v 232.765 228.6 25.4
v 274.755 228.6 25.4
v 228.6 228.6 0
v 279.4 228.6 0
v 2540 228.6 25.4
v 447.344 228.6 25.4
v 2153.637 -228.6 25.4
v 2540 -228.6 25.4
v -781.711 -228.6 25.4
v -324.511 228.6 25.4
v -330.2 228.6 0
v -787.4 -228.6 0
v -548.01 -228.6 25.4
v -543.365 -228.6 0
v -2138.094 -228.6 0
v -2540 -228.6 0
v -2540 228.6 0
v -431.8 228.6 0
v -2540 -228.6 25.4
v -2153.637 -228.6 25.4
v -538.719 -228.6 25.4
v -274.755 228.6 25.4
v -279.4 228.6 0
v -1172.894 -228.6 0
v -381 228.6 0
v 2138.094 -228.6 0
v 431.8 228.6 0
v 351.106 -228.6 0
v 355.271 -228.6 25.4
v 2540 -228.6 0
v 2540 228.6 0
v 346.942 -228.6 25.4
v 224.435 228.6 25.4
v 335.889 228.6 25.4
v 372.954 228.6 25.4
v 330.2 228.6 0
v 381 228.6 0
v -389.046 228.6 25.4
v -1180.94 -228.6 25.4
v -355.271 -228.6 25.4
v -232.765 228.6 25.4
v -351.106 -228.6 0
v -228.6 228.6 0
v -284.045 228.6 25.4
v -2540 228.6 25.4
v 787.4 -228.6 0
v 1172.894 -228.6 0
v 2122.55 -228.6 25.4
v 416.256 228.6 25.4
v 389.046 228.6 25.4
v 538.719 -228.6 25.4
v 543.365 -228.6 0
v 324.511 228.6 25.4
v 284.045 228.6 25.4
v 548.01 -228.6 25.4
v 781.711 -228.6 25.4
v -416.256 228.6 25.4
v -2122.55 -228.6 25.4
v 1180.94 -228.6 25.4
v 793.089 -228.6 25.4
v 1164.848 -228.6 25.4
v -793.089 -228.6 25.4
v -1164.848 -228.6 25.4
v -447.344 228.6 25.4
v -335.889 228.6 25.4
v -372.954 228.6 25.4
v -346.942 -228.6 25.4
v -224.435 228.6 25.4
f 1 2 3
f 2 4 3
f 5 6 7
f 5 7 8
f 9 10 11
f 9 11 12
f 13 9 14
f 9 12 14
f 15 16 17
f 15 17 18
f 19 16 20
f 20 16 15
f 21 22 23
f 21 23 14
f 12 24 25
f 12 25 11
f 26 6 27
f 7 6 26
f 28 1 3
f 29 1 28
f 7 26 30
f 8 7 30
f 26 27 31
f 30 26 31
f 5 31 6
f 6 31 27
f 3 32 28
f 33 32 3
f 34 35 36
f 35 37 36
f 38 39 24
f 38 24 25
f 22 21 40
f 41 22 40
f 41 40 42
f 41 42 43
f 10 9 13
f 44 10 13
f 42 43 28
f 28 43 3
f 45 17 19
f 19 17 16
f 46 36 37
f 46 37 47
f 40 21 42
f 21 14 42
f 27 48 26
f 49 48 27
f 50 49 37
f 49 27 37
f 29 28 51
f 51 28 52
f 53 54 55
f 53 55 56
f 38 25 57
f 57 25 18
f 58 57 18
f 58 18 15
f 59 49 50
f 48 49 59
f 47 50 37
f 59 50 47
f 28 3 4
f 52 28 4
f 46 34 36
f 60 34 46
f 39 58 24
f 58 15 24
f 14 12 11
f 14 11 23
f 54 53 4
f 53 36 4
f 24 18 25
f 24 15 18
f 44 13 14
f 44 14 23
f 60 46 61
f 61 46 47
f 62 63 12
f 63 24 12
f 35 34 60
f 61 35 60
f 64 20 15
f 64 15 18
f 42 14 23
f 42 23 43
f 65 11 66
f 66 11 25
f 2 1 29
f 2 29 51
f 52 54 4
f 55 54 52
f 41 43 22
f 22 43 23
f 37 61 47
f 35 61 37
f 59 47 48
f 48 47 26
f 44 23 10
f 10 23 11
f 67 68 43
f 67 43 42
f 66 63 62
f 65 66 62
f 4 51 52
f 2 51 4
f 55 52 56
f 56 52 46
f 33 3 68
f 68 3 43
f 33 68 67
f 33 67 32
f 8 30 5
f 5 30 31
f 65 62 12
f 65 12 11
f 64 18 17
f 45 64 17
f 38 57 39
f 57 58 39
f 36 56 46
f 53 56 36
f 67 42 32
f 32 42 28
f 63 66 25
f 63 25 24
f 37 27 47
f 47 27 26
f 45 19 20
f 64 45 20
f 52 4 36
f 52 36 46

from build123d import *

# Parameters (mm, degrees)
F2_DEPTH    = 25.4
F3_DEPTH    = 25.4
F4_DEPTH    = 25.4
F5_DEPTH    = 25.4
F6_DEPTH    = 25.4
F7_DEPTH    = 25.4
F8_DEPTH    = 25.4
F9_DEPTH    = 25.4
F10_DEPTH   = 25.4
F11_DEPTH   = 25.4
F12_DEPTH   = 25.4
F13_SIZE2   = 4.022955
F13_SIZE    = 25.39999
F14_SIZE2   = 4.022955
F14_SIZE    = 25.39999
F14_2_SIZE2 = 4.022955
F14_2_SIZE  = 25.39999
F15_SIZE2   = 4.022955
F15_SIZE    = 25.39999
F15_2_SIZE2 = 4.022955
F15_2_SIZE  = 25.39999
F16_SIZE2   = 4.022955
F16_SIZE    = 25.39999
F16_2_SIZE2 = 4.022955
F16_2_SIZE  = 25.39999
F17_SIZE2   = 4.022955
F17_SIZE    = 25.39999
F17_2_SIZE2 = 4.022955
F17_2_SIZE  = 25.39999
F18_SIZE2   = 4.022955
F18_SIZE    = 25.39999
F18_2_SIZE2 = 4.022955
F18_2_SIZE  = 25.39999
F19_SIZE2   = 4.022955
F19_SIZE    = 25.39999
F19_2_SIZE2 = 4.022955
F19_2_SIZE  = 25.39999
F20_SIZE2   = 4.022955
F20_SIZE    = 25.39999
F20_2_SIZE2 = 4.022955
F20_2_SIZE  = 25.39999
F21_SIZE2   = 4.022955
F21_SIZE    = 25.39999
F21_2_SIZE2 = 4.022955
F21_2_SIZE  = 25.39999
F22_SIZE2   = 4.022955
F22_SIZE    = 25.39999
F22_2_SIZE2 = 4.022955
F22_2_SIZE  = 25.39999
F23_SIZE2   = 4.022955
F23_SIZE    = 25.39999


# Not quite as in the source:
# - a fillet or chamfer is up to 0.001 mm smaller than in the source, because OpenCascade refuses the exact size


with BuildPart() as f2:
    # F1 (on Top) → F2 (new body)
    with BuildSketch(Plane.XY):
        Polygon((-431.8, 228.6), (-2540, 228.6), (-2540, -228.6), (-2138.0936292205, -228.6), align=None)
    extrude(amount=F2_DEPTH)

    # F13 (size 25.4 and 4.0229647842 in the source; OpenCascade refuses exactly that, so slightly less here)
    f13_edges = [f2.edges().sort_by_distance(p)[0] for p in [
        (-1284.946815, 0, 25.4),
    ]]
    f13_side = f2.faces().sort_by_distance((-1284.946815, 0, 12.7))[0]
    chamfer(f13_edges, length=F13_SIZE, length2=F13_SIZE2, reference=f13_side)


with BuildPart() as f3:
    # F1 (on Top) → F3 (new body)
    with BuildSketch(Plane.XY):
        Polygon((-381, 228.6), (-431.8, 228.6), (-2138.0936292205, -228.6), (-1172.8936292205, -228.6), align=None)
    extrude(amount=F3_DEPTH)

    # F14 (size 25.4 and 4.0229647842 in the source; OpenCascade refuses exactly that, so slightly less here)
    f14_edges = [f3.edges().sort_by_distance(p)[0] for p in [
        (-1284.946815, 0, 25.4),
    ]]
    f14_side = f3.faces().sort_by_distance((-1284.946815, 0, 12.7))[0]
    chamfer(f14_edges, length=F14_SIZE, length2=F14_SIZE2, reference=f14_side)

    # F14#2 (size 25.4 and 4.0229647842 in the source; OpenCascade refuses exactly that, so slightly less here)
    f14_2_edges = [f3.edges().sort_by_distance(p)[0] for p in [
        (-776.946815, 0, 25.4),
    ]]
    f14_2_side = f3.faces().sort_by_distance((-776.946815, 0, 12.7))[0]
    chamfer(f14_2_edges, length=F14_2_SIZE, length2=F14_2_SIZE2, reference=f14_2_side)


with BuildPart() as f4:
    # F1 (on Top) → F4 (new body)
    with BuildSketch(Plane.XY):
        Polygon((-330.2, 228.6), (-381, 228.6), (-1172.8936292205, -228.6), (-787.4, -228.6), align=None)
    extrude(amount=F4_DEPTH)

    # F15 (size 25.4 and 4.0229647842 in the source; OpenCascade refuses exactly that, so slightly less here)
    f15_edges = [f4.edges().sort_by_distance(p)[0] for p in [
        (-776.946815, 0, 25.4),
    ]]
    f15_side = f4.faces().sort_by_distance((-776.946815, 0, 12.7))[0]
    chamfer(f15_edges, length=F15_SIZE, length2=F15_SIZE2, reference=f15_side)

    # F15#2 (size 25.4 and 4.0229647842 in the source; OpenCascade refuses exactly that, so slightly less here)
    f15_2_edges = [f4.edges().sort_by_distance(p)[0] for p in [
        (-558.8, 0, 25.4),
    ]]
    f15_2_side = f4.faces().sort_by_distance((-558.8, 0, 12.7))[0]
    chamfer(f15_2_edges, length=F15_2_SIZE, length2=F15_2_SIZE2, reference=f15_2_side)


with BuildPart() as f5:
    # F1 (on Top) → F5 (new body)
    with BuildSketch(Plane.XY):
        Polygon((-279.4, 228.6), (-330.2, 228.6), (-787.4, -228.6), (-543.3645430735, -228.6), align=None)
    extrude(amount=F5_DEPTH)

    # F16 (size 25.4 and 4.0229647842 in the source; OpenCascade refuses exactly that, so slightly less here)
    f16_edges = [f5.edges().sort_by_distance(p)[0] for p in [
        (-558.8, 0, 25.4),
    ]]
    f16_side = f5.faces().sort_by_distance((-558.8, 0, 12.7))[0]
    chamfer(f16_edges, length=F16_SIZE, length2=F16_SIZE2, reference=f16_side)

    # F16#2 (size 25.4 and 4.0229647842 in the source; OpenCascade refuses exactly that, so slightly less here)
    f16_2_edges = [f5.edges().sort_by_distance(p)[0] for p in [
        (-411.382272, 0, 25.4),
    ]]
    f16_2_side = f5.faces().sort_by_distance((-411.382272, 0, 12.7))[0]
    chamfer(f16_2_edges, length=F16_2_SIZE, length2=F16_2_SIZE2, reference=f16_2_side)


with BuildPart() as f6:
    # F1 (on Top) → F6 (new body)
    with BuildSketch(Plane.XY):
        Polygon((-228.6, 228.6), (-279.4, 228.6), (-543.3645430735, -228.6), (-351.1063707795, -228.6), align=None)
    extrude(amount=F6_DEPTH)

    # F17 (size 25.4 and 4.0229647842 in the source; OpenCascade refuses exactly that, so slightly less here)
    f17_edges = [f6.edges().sort_by_distance(p)[0] for p in [
        (-411.382272, 0, 25.4),
    ]]
    f17_side = f6.faces().sort_by_distance((-411.382272, 0, 12.7))[0]
    chamfer(f17_edges, length=F17_SIZE, length2=F17_SIZE2, reference=f17_side)

    # F17#2 (size 25.4 and 4.0229647842 in the source; OpenCascade refuses exactly that, so slightly less here)
    f17_2_edges = [f6.edges().sort_by_distance(p)[0] for p in [
        (-289.853185, 0, 25.4),
    ]]
    f17_2_side = f6.faces().sort_by_distance((-289.853185, 0, 12.7))[0]
    chamfer(f17_2_edges, length=F17_2_SIZE, length2=F17_2_SIZE2, reference=f17_2_side)


with BuildPart() as f7:
    # F1 (on Top) → F7 (new body)
    with BuildSketch(Plane.XY):
        Polygon((228.6, 228.6), (-228.6, 228.6), (-351.1063707795, -228.6), (351.1063707795, -228.6), align=None)
    extrude(amount=F7_DEPTH)

    # F18 (size 25.4 and 4.0229647842 in the source; OpenCascade refuses exactly that, so slightly less here)
    f18_edges = [f7.edges().sort_by_distance(p)[0] for p in [
        (-289.853185, 0, 25.4),
    ]]
    f18_side = f7.faces().sort_by_distance((-289.853185, 0, 12.7))[0]
    chamfer(f18_edges, length=F18_SIZE, length2=F18_SIZE2, reference=f18_side)

    # F18#2 (size 25.4 and 4.0229647842 in the source; OpenCascade refuses exactly that, so slightly less here)
    f18_2_edges = [f7.edges().sort_by_distance(p)[0] for p in [
        (289.853185, 0, 25.4),
    ]]
    f18_2_side = f7.faces().sort_by_distance((289.853185, 0, 12.7))[0]
    chamfer(f18_2_edges, length=F18_2_SIZE, length2=F18_2_SIZE2, reference=f18_2_side)


with BuildPart() as f8:
    # F1 (on Top) → F8 (new body)
    with BuildSketch(Plane.XY):
        Polygon((279.4, 228.6), (228.6, 228.6), (351.1063707795, -228.6), (543.3645430735, -228.6), align=None)
    extrude(amount=F8_DEPTH)

    # F19 (size 25.4 and 4.0229647842 in the source; OpenCascade refuses exactly that, so slightly less here)
    f19_edges = [f8.edges().sort_by_distance(p)[0] for p in [
        (289.853185, 0, 25.4),
    ]]
    f19_side = f8.faces().sort_by_distance((289.853185, 0, 12.7))[0]
    chamfer(f19_edges, length=F19_SIZE, length2=F19_SIZE2, reference=f19_side)

    # F19#2 (size 25.4 and 4.0229647842 in the source; OpenCascade refuses exactly that, so slightly less here)
    f19_2_edges = [f8.edges().sort_by_distance(p)[0] for p in [
        (411.382272, 0, 25.4),
    ]]
    f19_2_side = f8.faces().sort_by_distance((411.382272, 0, 12.7))[0]
    chamfer(f19_2_edges, length=F19_2_SIZE, length2=F19_2_SIZE2, reference=f19_2_side)


with BuildPart() as f9:
    # F1 (on Top) → F9 (new body)
    with BuildSketch(Plane.XY):
        Polygon((330.2, 228.6), (279.4, 228.6), (543.3645430735, -228.6), (787.4, -228.6), align=None)
    extrude(amount=F9_DEPTH)

    # F20 (size 25.4 and 4.0229647842 in the source; OpenCascade refuses exactly that, so slightly less here)
    f20_edges = [f9.edges().sort_by_distance(p)[0] for p in [
        (411.382272, 0, 25.4),
    ]]
    f20_side = f9.faces().sort_by_distance((411.382272, 0, 12.7))[0]
    chamfer(f20_edges, length=F20_SIZE, length2=F20_SIZE2, reference=f20_side)

    # F20#2 (size 25.4 and 4.0229647842 in the source; OpenCascade refuses exactly that, so slightly less here)
    f20_2_edges = [f9.edges().sort_by_distance(p)[0] for p in [
        (558.8, 0, 25.4),
    ]]
    f20_2_side = f9.faces().sort_by_distance((558.8, 0, 12.7))[0]
    chamfer(f20_2_edges, length=F20_2_SIZE, length2=F20_2_SIZE2, reference=f20_2_side)


with BuildPart() as f10:
    # F1 (on Top) → F10 (new body)
    with BuildSketch(Plane.XY):
        Polygon((381, 228.6), (330.2, 228.6), (787.4, -228.6), (1172.8936292205, -228.6), align=None)
    extrude(amount=F10_DEPTH)

    # F21 (size 25.4 and 4.0229647842 in the source; OpenCascade refuses exactly that, so slightly less here)
    f21_edges = [f10.edges().sort_by_distance(p)[0] for p in [
        (558.8, 0, 25.4),
    ]]
    f21_side = f10.faces().sort_by_distance((558.8, 0, 12.7))[0]
    chamfer(f21_edges, length=F21_SIZE, length2=F21_SIZE2, reference=f21_side)

    # F21#2 (size 25.4 and 4.0229647842 in the source; OpenCascade refuses exactly that, so slightly less here)
    f21_2_edges = [f10.edges().sort_by_distance(p)[0] for p in [
        (776.946815, 0, 25.4),
    ]]
    f21_2_side = f10.faces().sort_by_distance((776.946815, 0, 12.7))[0]
    chamfer(f21_2_edges, length=F21_2_SIZE, length2=F21_2_SIZE2, reference=f21_2_side)


with BuildPart() as f11:
    # F1 (on Top) → F11 (new body)
    with BuildSketch(Plane.XY):
        Polygon((431.8, 228.6), (381, 228.6), (1172.8936292205, -228.6), (2138.0936292205, -228.6), align=None)
    extrude(amount=F11_DEPTH)

    # F22 (size 25.4 and 4.0229647842 in the source; OpenCascade refuses exactly that, so slightly less here)
    f22_edges = [f11.edges().sort_by_distance(p)[0] for p in [
        (776.946815, 0, 25.4),
    ]]
    f22_side = f11.faces().sort_by_distance((776.946815, 0, 12.7))[0]
    chamfer(f22_edges, length=F22_SIZE, length2=F22_SIZE2, reference=f22_side)

    # F22#2 (size 25.4 and 4.0229647842 in the source; OpenCascade refuses exactly that, so slightly less here)
    f22_2_edges = [f11.edges().sort_by_distance(p)[0] for p in [
        (1284.946815, 0, 25.4),
    ]]
    f22_2_side = f11.faces().sort_by_distance((1284.946815, 0, 12.7))[0]
    chamfer(f22_2_edges, length=F22_2_SIZE, length2=F22_2_SIZE2, reference=f22_2_side)


with BuildPart() as f12:
    # F1 (on Top) → F12 (new body)
    with BuildSketch(Plane.XY):
        Polygon((2540, 228.6), (431.8, 228.6), (2138.0936292205, -228.6), (2540, -228.6), align=None)
    extrude(amount=F12_DEPTH)

    # F23 (size 25.4 and 4.0229647842 in the source; OpenCascade refuses exactly that, so slightly less here)
    f23_edges = [f12.edges().sort_by_distance(p)[0] for p in [
        (1284.946815, 0, 25.4),
    ]]
    f23_side = f12.faces().sort_by_distance((1284.946815, 0, 12.7))[0]
    chamfer(f23_edges, length=F23_SIZE, length2=F23_SIZE2, reference=f23_side)


solid = Compound([f2.part, f3.part, f4.part, f5.part, f6.part, f7.part, f8.part, f9.part, f10.part, f11.part, f12.part])
